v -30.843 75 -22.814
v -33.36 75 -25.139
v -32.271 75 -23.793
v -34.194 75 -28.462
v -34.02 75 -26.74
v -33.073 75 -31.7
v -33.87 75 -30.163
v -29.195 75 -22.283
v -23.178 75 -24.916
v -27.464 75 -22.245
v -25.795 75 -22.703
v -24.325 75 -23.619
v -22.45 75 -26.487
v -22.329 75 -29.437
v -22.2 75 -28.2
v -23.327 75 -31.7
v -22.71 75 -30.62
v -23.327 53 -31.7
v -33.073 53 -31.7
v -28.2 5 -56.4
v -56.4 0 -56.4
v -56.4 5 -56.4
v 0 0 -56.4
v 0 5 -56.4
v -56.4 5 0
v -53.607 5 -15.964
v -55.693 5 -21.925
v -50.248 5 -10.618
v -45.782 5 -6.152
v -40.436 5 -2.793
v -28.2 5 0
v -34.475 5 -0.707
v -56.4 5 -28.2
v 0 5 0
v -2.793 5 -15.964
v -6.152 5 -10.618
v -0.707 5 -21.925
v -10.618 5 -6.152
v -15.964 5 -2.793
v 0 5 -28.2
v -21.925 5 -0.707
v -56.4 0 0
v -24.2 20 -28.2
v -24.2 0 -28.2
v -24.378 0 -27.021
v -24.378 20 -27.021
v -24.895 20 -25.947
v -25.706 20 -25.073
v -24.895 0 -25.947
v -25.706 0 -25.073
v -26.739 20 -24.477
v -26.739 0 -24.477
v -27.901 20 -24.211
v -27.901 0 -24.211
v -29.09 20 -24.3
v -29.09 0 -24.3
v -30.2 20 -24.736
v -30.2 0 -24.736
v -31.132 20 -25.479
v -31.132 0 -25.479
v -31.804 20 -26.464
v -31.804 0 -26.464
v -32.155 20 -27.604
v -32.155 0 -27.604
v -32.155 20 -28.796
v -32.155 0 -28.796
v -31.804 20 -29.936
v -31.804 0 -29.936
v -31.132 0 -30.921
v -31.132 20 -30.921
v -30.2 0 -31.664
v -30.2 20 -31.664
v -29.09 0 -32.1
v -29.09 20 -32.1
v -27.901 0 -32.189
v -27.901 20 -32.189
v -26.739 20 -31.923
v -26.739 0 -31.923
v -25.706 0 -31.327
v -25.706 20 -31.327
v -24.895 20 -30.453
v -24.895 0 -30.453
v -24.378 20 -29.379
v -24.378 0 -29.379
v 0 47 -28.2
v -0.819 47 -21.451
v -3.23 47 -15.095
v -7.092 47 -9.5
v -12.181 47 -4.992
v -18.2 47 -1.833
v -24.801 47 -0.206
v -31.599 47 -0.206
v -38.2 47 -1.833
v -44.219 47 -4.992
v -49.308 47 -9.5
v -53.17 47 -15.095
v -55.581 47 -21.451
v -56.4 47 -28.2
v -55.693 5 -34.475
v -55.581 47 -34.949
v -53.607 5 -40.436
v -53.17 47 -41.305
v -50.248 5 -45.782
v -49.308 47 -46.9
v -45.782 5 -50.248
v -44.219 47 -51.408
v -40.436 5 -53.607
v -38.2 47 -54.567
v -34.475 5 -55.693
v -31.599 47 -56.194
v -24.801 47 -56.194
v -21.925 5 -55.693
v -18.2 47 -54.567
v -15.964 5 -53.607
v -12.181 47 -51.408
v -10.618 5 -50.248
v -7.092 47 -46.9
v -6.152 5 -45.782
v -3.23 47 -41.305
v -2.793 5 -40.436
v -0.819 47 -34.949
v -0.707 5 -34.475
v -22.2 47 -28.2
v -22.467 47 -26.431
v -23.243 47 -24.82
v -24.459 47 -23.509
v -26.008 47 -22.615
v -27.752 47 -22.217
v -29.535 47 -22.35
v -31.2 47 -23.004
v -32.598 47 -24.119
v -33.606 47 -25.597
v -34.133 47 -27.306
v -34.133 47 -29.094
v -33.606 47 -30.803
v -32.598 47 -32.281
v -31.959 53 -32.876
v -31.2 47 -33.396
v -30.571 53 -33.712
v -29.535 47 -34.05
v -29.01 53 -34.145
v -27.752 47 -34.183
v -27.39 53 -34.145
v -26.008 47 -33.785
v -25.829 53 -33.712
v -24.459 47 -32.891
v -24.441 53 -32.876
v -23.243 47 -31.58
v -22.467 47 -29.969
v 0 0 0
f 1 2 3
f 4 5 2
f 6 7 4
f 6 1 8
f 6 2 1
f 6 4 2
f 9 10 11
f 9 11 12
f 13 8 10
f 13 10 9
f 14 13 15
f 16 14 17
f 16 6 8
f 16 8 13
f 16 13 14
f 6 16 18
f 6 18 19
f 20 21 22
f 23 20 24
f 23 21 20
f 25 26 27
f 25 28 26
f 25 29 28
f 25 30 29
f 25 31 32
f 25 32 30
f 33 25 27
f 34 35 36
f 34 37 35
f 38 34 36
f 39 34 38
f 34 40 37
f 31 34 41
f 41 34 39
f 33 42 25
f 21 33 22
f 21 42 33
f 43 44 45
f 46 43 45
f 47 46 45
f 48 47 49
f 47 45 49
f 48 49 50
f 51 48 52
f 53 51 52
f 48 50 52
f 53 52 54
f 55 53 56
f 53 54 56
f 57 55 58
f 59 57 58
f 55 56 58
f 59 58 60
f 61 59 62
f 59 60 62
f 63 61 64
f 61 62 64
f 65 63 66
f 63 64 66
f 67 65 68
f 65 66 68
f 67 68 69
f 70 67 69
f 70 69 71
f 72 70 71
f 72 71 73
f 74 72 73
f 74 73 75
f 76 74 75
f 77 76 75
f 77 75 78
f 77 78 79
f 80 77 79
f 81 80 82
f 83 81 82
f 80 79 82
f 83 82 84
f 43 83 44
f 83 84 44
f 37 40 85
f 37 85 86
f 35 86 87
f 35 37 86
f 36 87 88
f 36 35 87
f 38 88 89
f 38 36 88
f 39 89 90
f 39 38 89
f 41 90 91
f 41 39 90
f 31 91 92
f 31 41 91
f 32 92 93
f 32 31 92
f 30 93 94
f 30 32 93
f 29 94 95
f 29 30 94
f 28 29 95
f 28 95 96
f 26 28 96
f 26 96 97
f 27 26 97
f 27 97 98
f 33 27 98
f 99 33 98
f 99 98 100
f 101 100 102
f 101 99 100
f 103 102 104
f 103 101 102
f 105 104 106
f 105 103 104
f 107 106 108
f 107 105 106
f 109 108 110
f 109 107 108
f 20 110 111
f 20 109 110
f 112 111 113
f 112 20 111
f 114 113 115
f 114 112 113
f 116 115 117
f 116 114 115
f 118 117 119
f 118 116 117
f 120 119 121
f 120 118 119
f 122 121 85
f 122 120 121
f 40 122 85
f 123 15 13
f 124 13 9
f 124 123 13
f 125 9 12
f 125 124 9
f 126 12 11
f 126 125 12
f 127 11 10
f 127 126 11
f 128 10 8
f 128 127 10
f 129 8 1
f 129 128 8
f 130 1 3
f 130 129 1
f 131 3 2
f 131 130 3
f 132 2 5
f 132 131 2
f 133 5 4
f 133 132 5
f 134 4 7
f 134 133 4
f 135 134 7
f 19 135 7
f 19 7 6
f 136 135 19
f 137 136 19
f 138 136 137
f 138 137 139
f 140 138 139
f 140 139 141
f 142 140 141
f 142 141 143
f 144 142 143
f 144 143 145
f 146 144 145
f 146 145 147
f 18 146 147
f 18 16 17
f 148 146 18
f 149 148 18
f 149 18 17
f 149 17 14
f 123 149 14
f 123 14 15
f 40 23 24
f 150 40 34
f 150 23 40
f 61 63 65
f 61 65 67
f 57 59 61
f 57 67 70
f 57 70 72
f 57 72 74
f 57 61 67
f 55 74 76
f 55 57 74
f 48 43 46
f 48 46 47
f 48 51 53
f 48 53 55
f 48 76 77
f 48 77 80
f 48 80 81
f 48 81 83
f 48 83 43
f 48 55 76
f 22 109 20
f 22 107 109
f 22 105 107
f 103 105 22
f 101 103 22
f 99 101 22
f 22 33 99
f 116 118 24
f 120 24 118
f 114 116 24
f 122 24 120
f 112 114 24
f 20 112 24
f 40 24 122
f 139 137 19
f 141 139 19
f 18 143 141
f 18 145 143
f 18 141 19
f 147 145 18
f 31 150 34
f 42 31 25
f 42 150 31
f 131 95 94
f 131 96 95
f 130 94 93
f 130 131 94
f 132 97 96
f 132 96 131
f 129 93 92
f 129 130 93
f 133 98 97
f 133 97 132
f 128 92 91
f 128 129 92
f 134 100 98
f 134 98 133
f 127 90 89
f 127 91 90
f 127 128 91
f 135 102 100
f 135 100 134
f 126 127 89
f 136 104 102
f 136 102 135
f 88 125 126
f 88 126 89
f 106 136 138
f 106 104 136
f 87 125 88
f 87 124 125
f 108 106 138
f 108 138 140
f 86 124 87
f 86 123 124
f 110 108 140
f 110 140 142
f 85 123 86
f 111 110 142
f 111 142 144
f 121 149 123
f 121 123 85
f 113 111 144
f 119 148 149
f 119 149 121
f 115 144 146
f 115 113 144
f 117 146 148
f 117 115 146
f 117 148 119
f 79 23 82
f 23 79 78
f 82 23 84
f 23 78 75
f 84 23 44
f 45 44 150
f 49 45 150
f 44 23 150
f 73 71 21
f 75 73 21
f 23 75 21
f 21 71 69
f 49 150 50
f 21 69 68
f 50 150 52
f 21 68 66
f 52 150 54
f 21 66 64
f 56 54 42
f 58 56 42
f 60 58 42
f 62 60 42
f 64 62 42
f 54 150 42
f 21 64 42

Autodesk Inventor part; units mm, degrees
ref_plane "YZ Plane" through (0, 0, 0) normal (1, 0, 0) x (0, 1, 0)
ref_plane "XZ Plane" through (0, 0, 0) normal (0, 1, 0) x (-1, 0, 0)
ref_plane "XY Plane" through (0, 0, 0) normal (0, 0, 1) x (1, 0, 0)
sketch "Sketch1" plane through (0, 0, 0) normal (0, 1, 0) x (-1, 0, 0)
  line L0 (0, 0) -> (56.4, 0)
  line L1 (56.4, 0) -> (56.4, -56.4)
  line L2 (56.4, -56.4) -> (0, -56.4)
  line L3 (0, -56.4) -> (0, 0)
  dimension "d0" = 56.4
  dimension "d1" = 56.4
extrude "Extrusion1" add sketch "Sketch1" along normal blind 5
sketch "Sketch2" plane through (0, 5, 0) normal (0, 1, 0) x (1, 0, 0)
  circle A0 centre (-28.2, 28.2) radius 28.2
  line L0 (-56.4, 0) -> (0, 0) projected
  line L1 (-56.4, 56.4) -> (-56.4, 0) projected
  dimension "d4" = 56.4
  dimension "d5" = 28.2
  dimension "d6" = 28.2
extrude "Extrusion2" add sketch "Sketch2" along normal blind 42 contours A0
sketch "Sketch3" plane through (-28.2, 47, -28.2) normal (0, 1, 0) x (1, 0, 0)
  arc A0 (0, 28.2) -> (-28.2, 0) centre (0, 0) ccw projected
  circle A1 centre (0, 0) radius 6
  point P0 (28.2, -28.2)
  dimension "d9" = 12
extrude "g" add sketch "Sketch3" along normal blind 28
sketch "Sketch4" plane through (-28.2, 75, -28.2) normal (0, 1, 0) x (1, 0, 0)
  circle A0 centre (0, 0) radius 6 projected
  line L0 (0, 0) -> (0, -6)
  line L1 (0, 0) -> (0, 3.5)
  line L2 (0, 3.5) -> (-5, 3.5)
  line L3 (0, 3.5) -> (5, 3.5)
  line L4 (5, 3.5) -> (-5, 3.5)
  line L5 (-5, 3.5) -> (-5, 8.5)
  line L6 (-5, 8.5) -> (5, 8.5)
  line L7 (5, 8.5) -> (5, 3.5)
  point P0 (28.2, -28.2)
  dimension "d12" = 3.5
  dimension "d13" = 5
  dimension "d14" = 5
  dimension "d15" = 10
  dimension "d16" = 5
extrude "Extrusion4" cut sketch "Sketch4" against normal blind 22 contours L2 L5 L6 L7 L3 A0 | A0 L3 L2
sketch "Sketch5" plane through (0, 0, 0) normal (0, -1, 0) x (1, 0, 0)
  circle A0 centre (-28.2, -28.2) radius 28.2 projected
  circle A1 centre (-28.2, -28.2) radius 4
  point P0 (0, 0)
  dimension "d19" = 8
extrude "Extrusion5" cut sketch "Sketch5" against normal blind 20 contours A1
properties part number "2804S_NEMA2115_1Gearbox"
